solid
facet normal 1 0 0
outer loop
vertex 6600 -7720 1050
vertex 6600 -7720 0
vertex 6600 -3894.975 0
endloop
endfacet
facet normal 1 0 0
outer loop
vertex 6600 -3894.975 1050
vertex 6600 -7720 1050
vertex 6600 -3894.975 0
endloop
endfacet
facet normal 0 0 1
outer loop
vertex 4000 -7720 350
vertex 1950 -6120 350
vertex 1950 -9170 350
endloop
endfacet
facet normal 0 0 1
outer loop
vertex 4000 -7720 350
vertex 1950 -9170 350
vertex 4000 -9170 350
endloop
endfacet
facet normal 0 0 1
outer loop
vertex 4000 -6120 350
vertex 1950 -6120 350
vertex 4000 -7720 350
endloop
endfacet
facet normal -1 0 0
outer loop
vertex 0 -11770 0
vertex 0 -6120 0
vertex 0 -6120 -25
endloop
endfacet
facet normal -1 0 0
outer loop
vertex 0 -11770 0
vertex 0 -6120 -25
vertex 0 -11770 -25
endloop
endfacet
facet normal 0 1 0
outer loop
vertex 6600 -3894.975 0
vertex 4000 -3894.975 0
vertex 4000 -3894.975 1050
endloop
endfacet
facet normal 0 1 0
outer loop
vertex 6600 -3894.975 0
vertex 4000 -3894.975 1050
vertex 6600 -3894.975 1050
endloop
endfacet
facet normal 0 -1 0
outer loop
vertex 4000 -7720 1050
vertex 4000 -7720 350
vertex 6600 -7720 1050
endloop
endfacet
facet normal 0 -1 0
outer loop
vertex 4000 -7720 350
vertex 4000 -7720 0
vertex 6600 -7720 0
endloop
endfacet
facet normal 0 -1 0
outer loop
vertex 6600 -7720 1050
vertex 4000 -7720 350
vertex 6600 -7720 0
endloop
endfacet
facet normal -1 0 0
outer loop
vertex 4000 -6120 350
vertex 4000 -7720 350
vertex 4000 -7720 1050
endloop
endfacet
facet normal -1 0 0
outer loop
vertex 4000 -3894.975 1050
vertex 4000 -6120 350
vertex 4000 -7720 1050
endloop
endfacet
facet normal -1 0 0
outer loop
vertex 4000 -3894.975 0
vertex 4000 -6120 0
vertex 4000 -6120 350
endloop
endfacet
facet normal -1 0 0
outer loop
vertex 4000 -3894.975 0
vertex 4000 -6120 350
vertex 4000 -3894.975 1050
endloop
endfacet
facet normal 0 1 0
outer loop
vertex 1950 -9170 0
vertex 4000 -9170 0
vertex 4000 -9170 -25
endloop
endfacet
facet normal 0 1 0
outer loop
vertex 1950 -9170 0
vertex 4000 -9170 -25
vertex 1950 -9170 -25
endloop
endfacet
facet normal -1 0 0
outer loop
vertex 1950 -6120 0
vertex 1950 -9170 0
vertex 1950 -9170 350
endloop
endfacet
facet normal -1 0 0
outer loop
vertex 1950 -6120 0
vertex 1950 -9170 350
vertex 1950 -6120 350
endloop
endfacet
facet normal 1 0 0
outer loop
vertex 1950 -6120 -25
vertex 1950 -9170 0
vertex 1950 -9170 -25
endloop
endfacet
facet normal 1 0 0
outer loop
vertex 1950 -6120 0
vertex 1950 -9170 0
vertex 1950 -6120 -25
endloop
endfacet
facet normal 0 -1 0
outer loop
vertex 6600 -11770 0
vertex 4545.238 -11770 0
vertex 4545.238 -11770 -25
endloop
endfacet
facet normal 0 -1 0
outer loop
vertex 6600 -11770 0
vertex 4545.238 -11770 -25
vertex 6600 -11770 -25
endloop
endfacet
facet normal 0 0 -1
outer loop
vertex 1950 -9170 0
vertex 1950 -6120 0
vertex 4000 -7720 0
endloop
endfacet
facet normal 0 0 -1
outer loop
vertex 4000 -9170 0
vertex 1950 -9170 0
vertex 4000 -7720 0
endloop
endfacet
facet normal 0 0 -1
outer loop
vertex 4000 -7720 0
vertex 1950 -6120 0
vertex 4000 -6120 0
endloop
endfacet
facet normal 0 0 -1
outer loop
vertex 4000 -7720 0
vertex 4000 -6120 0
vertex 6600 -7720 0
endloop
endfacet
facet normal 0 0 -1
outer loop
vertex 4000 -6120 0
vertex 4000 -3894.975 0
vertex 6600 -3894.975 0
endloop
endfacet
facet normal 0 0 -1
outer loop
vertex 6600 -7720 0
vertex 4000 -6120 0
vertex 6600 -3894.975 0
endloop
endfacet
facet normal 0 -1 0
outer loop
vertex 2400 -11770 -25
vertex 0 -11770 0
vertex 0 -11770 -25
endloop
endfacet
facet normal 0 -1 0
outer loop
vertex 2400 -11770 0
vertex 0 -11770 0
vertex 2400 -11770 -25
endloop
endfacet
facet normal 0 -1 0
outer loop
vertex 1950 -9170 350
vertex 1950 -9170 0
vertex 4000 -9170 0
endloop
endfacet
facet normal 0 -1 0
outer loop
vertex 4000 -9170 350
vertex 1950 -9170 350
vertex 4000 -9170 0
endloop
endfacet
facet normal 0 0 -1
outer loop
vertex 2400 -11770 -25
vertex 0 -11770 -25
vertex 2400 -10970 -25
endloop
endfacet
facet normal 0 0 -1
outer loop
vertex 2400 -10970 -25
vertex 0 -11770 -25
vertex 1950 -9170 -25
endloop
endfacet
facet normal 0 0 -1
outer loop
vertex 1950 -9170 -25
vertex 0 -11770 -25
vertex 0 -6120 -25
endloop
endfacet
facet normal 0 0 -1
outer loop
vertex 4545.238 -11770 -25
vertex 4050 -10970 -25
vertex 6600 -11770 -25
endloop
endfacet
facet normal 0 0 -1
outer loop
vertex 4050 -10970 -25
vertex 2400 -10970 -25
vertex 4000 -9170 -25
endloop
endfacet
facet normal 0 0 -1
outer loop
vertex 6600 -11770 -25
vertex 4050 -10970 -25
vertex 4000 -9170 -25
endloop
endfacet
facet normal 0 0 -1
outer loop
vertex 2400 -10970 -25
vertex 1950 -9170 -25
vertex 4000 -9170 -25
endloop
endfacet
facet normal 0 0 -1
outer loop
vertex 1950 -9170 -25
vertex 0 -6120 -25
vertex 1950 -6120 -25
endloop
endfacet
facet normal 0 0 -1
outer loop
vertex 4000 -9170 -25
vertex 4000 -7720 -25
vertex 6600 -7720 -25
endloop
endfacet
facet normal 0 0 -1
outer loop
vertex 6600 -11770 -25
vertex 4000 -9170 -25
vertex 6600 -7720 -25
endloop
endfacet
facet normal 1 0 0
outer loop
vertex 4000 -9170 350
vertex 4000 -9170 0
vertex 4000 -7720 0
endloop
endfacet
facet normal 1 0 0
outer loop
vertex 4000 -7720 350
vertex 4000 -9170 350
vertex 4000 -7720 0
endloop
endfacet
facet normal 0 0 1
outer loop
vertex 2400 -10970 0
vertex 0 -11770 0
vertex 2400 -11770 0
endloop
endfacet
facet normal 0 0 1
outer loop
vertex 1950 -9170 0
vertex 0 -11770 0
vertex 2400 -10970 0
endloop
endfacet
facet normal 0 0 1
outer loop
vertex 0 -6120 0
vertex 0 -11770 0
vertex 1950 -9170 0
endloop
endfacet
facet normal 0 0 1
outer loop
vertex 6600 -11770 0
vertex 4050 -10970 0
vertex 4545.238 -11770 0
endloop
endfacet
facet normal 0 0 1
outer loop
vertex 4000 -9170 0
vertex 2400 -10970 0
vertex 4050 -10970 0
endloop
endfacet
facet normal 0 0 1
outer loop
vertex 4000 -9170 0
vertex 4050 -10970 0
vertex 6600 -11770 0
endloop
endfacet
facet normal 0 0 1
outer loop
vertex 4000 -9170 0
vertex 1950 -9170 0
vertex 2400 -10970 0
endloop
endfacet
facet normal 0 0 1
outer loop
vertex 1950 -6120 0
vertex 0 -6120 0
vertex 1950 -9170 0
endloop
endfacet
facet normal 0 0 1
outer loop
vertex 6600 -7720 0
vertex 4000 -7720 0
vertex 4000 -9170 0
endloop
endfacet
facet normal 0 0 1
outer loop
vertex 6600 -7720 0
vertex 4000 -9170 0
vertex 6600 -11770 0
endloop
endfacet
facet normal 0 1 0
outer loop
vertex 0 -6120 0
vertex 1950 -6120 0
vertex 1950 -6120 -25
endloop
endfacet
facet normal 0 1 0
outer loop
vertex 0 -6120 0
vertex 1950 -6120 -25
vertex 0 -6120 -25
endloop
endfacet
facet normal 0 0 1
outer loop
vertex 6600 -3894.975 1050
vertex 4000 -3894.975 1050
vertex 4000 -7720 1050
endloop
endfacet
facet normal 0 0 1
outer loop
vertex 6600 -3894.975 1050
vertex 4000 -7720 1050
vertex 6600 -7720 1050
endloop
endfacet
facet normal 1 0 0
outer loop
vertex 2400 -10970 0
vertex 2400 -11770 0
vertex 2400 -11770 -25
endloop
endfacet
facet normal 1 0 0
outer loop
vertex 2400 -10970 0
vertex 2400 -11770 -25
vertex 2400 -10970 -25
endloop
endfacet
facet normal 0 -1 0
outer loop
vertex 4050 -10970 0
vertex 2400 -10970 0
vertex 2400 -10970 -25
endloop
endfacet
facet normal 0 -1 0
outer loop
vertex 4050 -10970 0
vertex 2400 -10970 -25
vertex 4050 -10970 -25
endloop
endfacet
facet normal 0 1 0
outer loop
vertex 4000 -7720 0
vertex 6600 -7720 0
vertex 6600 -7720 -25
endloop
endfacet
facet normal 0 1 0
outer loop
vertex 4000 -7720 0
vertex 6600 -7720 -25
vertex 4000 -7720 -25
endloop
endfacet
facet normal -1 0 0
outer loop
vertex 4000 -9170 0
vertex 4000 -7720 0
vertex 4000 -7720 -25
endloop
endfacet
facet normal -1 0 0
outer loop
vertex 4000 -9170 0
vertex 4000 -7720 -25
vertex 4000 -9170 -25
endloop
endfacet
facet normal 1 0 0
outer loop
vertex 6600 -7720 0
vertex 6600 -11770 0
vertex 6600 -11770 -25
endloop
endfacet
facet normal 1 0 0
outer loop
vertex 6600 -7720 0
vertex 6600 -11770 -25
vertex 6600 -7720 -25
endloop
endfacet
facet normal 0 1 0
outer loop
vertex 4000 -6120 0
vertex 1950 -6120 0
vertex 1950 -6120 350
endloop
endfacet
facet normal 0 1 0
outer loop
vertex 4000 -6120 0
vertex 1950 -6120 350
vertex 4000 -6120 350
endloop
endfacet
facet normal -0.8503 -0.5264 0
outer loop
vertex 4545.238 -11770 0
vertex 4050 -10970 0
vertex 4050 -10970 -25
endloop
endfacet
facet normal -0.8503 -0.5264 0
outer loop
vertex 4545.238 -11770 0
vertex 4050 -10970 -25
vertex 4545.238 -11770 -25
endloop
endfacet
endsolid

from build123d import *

# Parameters (mm, degrees)
F1_W     = 2050
F1_H     = 3050
F2_DEPTH = 350
F3_W     = 2600
F3_H     = 3825.0252531694
F4_DEPTH = 1050
F6_DEPTH = 25


with BuildPart() as f2:
    # F1 (on Top) → F2 (new body)
    with BuildSketch(Plane.XY):
        with Locations((2975, -7645)):
            Rectangle(F1_W, F1_H)
    extrude(amount=F2_DEPTH)

    # F3 (on Top) → F4 (join)
    with BuildSketch(Plane.XY):
        with Locations((5300, -5807.4873734153)):
            Rectangle(F3_W, F3_H)
    extrude(amount=F4_DEPTH)

    # F5 (on Top) → F6 (join)
    with BuildSketch(Plane.XY):
        Polygon((1950, -6120), (0, -6120), (0, -11770), (2400, -11770), (2400, -10970), (4050, -10970), (4545.2380952381, -11770), (6600, -11770), (6600, -7720), (4000, -7720), (4000, -9170), (1950, -9170), align=None)
    extrude(amount=-F6_DEPTH)


solid = f2.part
